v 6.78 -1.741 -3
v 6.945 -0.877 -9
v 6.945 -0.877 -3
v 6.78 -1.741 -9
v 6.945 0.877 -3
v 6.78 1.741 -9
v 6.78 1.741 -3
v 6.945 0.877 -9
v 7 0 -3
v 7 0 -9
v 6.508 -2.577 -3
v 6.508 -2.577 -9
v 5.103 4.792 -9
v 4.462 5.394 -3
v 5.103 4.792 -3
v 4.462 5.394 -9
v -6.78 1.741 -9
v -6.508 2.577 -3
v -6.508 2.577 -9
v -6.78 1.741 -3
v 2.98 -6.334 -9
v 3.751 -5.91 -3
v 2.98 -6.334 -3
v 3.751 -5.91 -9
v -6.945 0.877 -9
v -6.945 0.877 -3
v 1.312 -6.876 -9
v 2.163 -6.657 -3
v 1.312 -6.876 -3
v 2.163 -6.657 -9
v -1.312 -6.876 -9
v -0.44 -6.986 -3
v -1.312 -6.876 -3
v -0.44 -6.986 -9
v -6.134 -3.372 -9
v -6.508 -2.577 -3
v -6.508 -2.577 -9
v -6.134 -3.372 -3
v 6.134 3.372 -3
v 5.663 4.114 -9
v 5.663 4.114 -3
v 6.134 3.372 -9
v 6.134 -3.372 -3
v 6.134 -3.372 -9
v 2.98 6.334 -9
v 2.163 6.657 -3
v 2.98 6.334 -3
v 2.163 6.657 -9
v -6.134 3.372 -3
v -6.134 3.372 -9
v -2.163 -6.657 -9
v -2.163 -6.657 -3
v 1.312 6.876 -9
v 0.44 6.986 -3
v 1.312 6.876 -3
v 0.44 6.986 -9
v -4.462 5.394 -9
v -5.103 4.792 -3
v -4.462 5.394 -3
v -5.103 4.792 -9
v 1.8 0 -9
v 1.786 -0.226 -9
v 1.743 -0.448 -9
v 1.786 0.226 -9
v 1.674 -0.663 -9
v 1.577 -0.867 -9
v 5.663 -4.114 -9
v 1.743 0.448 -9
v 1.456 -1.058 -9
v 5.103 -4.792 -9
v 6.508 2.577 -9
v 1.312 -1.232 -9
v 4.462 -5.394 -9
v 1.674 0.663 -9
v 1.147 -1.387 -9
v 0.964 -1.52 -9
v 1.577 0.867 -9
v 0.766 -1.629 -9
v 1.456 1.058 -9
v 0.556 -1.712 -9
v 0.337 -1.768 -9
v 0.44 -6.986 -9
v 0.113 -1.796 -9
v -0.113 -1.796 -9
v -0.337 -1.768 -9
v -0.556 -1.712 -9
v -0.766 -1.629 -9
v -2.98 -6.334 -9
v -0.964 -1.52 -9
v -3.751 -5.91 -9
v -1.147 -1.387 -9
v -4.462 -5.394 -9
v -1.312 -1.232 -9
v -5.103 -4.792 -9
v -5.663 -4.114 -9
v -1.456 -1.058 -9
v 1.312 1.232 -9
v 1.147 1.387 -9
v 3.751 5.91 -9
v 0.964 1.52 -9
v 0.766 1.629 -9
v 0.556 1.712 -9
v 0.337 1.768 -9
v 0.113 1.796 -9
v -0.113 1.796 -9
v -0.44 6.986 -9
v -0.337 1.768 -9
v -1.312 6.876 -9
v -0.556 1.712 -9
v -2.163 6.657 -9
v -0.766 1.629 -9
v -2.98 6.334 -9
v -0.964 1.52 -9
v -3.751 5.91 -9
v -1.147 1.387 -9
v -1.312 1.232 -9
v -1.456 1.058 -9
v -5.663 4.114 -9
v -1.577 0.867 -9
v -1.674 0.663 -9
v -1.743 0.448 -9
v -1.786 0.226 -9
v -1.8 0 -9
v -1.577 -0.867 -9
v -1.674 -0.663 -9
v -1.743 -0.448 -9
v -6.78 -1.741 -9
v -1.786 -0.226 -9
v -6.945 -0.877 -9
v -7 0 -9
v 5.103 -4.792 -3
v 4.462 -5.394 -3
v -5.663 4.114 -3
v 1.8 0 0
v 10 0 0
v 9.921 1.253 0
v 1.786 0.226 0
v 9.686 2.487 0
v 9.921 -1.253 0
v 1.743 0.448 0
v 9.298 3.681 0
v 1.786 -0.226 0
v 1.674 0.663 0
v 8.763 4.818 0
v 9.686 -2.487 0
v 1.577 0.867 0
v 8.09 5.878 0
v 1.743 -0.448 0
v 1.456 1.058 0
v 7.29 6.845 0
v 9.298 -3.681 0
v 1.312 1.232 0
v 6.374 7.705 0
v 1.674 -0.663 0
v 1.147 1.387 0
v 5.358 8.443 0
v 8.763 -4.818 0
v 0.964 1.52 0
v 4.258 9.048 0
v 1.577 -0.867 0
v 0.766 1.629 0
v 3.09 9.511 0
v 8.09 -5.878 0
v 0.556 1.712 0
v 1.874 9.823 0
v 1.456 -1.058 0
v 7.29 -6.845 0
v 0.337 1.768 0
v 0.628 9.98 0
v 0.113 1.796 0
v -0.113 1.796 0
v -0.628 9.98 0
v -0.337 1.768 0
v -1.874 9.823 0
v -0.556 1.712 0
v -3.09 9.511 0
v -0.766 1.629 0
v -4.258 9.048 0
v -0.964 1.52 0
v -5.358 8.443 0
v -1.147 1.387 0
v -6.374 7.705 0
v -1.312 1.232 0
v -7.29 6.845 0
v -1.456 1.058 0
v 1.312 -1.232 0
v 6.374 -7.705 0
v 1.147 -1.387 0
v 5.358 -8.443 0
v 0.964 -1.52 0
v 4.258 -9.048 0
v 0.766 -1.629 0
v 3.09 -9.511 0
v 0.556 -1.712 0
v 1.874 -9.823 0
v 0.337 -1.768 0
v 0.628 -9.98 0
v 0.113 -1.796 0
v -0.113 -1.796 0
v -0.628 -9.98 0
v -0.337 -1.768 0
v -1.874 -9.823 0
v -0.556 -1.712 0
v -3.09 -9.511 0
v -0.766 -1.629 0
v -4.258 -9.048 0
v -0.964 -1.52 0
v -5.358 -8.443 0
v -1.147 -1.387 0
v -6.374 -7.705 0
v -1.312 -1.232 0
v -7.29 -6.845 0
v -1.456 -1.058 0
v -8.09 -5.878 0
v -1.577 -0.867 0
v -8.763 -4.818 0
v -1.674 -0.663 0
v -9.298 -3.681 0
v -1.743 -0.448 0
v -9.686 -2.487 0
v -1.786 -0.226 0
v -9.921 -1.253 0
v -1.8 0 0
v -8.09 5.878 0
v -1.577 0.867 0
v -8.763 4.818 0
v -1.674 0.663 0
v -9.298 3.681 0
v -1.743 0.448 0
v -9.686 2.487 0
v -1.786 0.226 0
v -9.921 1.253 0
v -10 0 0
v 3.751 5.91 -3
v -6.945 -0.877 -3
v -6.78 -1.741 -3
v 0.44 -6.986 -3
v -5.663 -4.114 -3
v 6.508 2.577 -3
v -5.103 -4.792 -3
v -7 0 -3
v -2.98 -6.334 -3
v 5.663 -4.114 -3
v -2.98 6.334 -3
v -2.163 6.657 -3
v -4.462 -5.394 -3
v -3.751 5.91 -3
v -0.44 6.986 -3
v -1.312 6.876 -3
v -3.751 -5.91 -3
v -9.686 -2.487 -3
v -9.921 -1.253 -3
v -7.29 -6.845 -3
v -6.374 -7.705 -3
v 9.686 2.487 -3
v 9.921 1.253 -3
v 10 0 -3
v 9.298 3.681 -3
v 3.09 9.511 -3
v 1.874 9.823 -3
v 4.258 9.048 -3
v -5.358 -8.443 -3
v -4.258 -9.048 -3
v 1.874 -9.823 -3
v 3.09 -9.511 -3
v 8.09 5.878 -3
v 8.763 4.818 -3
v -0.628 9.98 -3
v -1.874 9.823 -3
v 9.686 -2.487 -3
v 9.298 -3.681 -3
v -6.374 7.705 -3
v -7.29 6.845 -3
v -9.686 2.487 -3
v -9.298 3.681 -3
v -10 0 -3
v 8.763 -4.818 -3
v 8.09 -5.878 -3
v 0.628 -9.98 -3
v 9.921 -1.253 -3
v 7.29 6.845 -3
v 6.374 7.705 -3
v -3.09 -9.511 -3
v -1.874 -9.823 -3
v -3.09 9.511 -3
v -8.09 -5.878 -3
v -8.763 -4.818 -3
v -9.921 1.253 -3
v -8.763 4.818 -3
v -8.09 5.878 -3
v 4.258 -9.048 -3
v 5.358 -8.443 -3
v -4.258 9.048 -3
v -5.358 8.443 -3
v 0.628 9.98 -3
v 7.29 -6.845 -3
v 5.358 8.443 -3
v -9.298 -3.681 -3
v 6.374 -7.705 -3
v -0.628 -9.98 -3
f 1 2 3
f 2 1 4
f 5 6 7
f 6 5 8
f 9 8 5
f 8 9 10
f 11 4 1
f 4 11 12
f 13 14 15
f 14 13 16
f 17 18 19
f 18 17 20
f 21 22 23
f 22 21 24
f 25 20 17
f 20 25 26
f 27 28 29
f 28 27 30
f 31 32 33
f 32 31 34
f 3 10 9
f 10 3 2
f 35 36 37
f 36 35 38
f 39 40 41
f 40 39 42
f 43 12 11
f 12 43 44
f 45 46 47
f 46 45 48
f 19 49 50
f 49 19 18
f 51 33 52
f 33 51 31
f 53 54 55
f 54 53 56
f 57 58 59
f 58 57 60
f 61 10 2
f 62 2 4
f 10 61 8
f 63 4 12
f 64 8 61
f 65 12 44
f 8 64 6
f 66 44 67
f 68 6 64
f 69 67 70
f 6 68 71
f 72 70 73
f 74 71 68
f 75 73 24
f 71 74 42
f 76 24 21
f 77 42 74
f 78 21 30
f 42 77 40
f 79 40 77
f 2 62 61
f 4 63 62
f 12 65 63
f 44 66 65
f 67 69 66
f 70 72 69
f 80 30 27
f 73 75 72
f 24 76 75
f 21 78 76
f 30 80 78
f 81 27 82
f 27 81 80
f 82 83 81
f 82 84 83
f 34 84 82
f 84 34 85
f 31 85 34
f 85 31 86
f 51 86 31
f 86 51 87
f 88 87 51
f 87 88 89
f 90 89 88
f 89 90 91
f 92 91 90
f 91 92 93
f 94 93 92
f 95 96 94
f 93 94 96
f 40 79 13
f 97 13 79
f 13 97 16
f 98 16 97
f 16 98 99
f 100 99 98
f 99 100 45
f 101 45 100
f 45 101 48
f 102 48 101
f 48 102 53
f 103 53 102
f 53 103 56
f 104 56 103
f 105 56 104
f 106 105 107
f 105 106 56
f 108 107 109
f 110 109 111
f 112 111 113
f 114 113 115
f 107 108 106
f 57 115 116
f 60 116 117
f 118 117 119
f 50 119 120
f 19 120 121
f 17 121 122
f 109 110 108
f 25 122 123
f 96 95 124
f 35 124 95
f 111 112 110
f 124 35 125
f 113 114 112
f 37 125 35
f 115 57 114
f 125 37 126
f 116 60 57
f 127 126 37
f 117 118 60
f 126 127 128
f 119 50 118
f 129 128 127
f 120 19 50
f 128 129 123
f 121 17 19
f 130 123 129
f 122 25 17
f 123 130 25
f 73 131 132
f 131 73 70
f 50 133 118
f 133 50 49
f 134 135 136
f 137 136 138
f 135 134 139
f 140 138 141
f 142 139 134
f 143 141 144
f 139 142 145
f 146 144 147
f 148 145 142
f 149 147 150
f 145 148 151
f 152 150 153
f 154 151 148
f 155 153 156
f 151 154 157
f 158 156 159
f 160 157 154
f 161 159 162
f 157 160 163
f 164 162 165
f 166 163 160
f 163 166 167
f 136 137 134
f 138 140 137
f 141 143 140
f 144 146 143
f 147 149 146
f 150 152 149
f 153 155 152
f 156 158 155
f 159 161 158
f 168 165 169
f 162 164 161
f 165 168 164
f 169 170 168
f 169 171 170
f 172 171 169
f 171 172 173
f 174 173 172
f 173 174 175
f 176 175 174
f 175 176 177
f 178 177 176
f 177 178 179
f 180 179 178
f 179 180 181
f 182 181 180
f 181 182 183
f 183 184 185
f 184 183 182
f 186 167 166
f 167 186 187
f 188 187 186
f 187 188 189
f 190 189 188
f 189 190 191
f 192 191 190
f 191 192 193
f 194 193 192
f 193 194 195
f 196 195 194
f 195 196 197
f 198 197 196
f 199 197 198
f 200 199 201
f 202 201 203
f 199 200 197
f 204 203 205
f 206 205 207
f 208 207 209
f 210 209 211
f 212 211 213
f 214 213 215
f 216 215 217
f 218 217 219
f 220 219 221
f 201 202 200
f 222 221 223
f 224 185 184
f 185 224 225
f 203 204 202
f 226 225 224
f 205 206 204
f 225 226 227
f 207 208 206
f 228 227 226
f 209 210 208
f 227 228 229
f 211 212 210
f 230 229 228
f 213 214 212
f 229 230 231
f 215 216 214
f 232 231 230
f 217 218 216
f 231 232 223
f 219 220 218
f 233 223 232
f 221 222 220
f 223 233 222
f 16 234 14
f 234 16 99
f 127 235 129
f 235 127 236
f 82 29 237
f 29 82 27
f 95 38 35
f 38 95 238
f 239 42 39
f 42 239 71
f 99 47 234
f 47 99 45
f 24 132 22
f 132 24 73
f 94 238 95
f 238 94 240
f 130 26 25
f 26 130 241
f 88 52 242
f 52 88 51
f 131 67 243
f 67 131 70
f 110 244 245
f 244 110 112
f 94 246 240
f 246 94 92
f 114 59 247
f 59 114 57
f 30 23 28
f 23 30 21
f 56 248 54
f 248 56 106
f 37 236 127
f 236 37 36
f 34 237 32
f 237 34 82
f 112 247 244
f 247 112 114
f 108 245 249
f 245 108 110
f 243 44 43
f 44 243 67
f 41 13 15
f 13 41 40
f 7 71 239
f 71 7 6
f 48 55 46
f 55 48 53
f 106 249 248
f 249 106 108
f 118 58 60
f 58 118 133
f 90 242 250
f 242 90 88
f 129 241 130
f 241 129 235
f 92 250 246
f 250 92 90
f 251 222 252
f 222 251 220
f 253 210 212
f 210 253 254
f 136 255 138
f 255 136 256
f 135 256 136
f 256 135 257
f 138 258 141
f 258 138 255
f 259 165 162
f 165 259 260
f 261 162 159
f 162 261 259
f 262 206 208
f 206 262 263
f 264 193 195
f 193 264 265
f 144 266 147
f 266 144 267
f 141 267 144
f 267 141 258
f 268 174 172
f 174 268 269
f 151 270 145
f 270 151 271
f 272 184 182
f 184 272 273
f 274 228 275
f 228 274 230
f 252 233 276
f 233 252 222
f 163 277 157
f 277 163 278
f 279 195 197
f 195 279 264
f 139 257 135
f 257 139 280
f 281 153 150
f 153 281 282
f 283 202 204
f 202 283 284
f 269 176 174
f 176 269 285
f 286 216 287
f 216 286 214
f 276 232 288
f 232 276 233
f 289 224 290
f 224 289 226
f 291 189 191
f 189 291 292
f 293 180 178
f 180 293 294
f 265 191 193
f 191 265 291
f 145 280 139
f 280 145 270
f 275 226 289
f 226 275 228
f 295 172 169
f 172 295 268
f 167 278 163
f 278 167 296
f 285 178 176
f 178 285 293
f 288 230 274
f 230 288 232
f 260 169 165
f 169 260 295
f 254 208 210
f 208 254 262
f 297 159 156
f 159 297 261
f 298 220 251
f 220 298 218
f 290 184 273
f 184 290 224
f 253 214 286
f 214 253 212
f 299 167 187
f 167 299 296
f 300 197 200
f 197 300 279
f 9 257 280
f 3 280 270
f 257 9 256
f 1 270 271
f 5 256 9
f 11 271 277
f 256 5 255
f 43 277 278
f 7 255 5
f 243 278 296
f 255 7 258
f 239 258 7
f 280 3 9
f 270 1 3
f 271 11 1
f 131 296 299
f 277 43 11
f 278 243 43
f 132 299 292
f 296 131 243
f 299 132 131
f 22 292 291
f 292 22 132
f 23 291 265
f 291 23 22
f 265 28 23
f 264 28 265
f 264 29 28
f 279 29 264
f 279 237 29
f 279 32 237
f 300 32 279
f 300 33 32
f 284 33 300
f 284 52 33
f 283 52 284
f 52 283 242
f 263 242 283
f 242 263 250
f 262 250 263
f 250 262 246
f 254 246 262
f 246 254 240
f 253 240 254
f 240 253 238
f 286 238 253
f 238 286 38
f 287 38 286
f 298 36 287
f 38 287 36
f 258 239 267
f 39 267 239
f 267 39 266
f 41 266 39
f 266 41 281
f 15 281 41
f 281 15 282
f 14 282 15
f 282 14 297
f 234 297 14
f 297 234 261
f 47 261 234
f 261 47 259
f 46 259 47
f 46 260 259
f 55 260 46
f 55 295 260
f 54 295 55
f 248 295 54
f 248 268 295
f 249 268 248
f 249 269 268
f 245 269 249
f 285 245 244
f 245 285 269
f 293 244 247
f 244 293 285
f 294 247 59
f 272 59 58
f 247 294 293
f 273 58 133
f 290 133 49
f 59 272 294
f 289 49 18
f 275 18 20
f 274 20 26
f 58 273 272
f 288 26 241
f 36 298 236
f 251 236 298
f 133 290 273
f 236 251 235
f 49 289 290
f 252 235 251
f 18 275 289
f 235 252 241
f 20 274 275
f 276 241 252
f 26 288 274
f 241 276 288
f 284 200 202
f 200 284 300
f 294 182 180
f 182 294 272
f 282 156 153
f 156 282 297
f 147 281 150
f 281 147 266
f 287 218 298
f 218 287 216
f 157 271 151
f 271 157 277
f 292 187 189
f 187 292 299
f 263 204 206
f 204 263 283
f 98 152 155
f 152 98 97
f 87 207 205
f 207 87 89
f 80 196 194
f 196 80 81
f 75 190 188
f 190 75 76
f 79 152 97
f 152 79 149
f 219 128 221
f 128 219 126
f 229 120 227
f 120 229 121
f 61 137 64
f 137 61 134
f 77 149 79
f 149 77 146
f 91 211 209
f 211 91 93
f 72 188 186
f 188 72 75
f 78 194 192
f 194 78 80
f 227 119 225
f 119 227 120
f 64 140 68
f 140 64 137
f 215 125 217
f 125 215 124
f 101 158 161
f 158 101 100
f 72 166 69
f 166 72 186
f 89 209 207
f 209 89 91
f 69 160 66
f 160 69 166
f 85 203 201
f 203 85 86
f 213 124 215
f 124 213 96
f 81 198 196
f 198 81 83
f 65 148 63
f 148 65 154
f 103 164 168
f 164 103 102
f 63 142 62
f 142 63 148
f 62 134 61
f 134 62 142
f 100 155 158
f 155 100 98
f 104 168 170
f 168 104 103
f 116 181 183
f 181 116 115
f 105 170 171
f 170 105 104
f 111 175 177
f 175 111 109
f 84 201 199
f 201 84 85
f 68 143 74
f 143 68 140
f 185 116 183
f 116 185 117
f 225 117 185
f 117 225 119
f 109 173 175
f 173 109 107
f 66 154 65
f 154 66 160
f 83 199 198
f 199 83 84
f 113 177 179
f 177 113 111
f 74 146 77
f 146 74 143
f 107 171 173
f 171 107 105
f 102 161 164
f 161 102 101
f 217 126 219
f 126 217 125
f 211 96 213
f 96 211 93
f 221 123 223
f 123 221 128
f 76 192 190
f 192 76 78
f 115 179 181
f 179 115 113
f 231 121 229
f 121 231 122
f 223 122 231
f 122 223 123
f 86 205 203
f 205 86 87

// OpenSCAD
$fn = 50;


difference() {
	union() {
		translate(v = [0, 0, -9.0000000000]) {
			cylinder(h = 9, r = 7.0000000000);
		}
		translate(v = [0, 0, -3.0000000000]) {
			cylinder(h = 3, r = 10.0000000000);
		}
	}
	union() {
		#translate(v = [0, 0, -9]) {
			cylinder(h = 9, r = 1.8000000000);
		}
	}
}
